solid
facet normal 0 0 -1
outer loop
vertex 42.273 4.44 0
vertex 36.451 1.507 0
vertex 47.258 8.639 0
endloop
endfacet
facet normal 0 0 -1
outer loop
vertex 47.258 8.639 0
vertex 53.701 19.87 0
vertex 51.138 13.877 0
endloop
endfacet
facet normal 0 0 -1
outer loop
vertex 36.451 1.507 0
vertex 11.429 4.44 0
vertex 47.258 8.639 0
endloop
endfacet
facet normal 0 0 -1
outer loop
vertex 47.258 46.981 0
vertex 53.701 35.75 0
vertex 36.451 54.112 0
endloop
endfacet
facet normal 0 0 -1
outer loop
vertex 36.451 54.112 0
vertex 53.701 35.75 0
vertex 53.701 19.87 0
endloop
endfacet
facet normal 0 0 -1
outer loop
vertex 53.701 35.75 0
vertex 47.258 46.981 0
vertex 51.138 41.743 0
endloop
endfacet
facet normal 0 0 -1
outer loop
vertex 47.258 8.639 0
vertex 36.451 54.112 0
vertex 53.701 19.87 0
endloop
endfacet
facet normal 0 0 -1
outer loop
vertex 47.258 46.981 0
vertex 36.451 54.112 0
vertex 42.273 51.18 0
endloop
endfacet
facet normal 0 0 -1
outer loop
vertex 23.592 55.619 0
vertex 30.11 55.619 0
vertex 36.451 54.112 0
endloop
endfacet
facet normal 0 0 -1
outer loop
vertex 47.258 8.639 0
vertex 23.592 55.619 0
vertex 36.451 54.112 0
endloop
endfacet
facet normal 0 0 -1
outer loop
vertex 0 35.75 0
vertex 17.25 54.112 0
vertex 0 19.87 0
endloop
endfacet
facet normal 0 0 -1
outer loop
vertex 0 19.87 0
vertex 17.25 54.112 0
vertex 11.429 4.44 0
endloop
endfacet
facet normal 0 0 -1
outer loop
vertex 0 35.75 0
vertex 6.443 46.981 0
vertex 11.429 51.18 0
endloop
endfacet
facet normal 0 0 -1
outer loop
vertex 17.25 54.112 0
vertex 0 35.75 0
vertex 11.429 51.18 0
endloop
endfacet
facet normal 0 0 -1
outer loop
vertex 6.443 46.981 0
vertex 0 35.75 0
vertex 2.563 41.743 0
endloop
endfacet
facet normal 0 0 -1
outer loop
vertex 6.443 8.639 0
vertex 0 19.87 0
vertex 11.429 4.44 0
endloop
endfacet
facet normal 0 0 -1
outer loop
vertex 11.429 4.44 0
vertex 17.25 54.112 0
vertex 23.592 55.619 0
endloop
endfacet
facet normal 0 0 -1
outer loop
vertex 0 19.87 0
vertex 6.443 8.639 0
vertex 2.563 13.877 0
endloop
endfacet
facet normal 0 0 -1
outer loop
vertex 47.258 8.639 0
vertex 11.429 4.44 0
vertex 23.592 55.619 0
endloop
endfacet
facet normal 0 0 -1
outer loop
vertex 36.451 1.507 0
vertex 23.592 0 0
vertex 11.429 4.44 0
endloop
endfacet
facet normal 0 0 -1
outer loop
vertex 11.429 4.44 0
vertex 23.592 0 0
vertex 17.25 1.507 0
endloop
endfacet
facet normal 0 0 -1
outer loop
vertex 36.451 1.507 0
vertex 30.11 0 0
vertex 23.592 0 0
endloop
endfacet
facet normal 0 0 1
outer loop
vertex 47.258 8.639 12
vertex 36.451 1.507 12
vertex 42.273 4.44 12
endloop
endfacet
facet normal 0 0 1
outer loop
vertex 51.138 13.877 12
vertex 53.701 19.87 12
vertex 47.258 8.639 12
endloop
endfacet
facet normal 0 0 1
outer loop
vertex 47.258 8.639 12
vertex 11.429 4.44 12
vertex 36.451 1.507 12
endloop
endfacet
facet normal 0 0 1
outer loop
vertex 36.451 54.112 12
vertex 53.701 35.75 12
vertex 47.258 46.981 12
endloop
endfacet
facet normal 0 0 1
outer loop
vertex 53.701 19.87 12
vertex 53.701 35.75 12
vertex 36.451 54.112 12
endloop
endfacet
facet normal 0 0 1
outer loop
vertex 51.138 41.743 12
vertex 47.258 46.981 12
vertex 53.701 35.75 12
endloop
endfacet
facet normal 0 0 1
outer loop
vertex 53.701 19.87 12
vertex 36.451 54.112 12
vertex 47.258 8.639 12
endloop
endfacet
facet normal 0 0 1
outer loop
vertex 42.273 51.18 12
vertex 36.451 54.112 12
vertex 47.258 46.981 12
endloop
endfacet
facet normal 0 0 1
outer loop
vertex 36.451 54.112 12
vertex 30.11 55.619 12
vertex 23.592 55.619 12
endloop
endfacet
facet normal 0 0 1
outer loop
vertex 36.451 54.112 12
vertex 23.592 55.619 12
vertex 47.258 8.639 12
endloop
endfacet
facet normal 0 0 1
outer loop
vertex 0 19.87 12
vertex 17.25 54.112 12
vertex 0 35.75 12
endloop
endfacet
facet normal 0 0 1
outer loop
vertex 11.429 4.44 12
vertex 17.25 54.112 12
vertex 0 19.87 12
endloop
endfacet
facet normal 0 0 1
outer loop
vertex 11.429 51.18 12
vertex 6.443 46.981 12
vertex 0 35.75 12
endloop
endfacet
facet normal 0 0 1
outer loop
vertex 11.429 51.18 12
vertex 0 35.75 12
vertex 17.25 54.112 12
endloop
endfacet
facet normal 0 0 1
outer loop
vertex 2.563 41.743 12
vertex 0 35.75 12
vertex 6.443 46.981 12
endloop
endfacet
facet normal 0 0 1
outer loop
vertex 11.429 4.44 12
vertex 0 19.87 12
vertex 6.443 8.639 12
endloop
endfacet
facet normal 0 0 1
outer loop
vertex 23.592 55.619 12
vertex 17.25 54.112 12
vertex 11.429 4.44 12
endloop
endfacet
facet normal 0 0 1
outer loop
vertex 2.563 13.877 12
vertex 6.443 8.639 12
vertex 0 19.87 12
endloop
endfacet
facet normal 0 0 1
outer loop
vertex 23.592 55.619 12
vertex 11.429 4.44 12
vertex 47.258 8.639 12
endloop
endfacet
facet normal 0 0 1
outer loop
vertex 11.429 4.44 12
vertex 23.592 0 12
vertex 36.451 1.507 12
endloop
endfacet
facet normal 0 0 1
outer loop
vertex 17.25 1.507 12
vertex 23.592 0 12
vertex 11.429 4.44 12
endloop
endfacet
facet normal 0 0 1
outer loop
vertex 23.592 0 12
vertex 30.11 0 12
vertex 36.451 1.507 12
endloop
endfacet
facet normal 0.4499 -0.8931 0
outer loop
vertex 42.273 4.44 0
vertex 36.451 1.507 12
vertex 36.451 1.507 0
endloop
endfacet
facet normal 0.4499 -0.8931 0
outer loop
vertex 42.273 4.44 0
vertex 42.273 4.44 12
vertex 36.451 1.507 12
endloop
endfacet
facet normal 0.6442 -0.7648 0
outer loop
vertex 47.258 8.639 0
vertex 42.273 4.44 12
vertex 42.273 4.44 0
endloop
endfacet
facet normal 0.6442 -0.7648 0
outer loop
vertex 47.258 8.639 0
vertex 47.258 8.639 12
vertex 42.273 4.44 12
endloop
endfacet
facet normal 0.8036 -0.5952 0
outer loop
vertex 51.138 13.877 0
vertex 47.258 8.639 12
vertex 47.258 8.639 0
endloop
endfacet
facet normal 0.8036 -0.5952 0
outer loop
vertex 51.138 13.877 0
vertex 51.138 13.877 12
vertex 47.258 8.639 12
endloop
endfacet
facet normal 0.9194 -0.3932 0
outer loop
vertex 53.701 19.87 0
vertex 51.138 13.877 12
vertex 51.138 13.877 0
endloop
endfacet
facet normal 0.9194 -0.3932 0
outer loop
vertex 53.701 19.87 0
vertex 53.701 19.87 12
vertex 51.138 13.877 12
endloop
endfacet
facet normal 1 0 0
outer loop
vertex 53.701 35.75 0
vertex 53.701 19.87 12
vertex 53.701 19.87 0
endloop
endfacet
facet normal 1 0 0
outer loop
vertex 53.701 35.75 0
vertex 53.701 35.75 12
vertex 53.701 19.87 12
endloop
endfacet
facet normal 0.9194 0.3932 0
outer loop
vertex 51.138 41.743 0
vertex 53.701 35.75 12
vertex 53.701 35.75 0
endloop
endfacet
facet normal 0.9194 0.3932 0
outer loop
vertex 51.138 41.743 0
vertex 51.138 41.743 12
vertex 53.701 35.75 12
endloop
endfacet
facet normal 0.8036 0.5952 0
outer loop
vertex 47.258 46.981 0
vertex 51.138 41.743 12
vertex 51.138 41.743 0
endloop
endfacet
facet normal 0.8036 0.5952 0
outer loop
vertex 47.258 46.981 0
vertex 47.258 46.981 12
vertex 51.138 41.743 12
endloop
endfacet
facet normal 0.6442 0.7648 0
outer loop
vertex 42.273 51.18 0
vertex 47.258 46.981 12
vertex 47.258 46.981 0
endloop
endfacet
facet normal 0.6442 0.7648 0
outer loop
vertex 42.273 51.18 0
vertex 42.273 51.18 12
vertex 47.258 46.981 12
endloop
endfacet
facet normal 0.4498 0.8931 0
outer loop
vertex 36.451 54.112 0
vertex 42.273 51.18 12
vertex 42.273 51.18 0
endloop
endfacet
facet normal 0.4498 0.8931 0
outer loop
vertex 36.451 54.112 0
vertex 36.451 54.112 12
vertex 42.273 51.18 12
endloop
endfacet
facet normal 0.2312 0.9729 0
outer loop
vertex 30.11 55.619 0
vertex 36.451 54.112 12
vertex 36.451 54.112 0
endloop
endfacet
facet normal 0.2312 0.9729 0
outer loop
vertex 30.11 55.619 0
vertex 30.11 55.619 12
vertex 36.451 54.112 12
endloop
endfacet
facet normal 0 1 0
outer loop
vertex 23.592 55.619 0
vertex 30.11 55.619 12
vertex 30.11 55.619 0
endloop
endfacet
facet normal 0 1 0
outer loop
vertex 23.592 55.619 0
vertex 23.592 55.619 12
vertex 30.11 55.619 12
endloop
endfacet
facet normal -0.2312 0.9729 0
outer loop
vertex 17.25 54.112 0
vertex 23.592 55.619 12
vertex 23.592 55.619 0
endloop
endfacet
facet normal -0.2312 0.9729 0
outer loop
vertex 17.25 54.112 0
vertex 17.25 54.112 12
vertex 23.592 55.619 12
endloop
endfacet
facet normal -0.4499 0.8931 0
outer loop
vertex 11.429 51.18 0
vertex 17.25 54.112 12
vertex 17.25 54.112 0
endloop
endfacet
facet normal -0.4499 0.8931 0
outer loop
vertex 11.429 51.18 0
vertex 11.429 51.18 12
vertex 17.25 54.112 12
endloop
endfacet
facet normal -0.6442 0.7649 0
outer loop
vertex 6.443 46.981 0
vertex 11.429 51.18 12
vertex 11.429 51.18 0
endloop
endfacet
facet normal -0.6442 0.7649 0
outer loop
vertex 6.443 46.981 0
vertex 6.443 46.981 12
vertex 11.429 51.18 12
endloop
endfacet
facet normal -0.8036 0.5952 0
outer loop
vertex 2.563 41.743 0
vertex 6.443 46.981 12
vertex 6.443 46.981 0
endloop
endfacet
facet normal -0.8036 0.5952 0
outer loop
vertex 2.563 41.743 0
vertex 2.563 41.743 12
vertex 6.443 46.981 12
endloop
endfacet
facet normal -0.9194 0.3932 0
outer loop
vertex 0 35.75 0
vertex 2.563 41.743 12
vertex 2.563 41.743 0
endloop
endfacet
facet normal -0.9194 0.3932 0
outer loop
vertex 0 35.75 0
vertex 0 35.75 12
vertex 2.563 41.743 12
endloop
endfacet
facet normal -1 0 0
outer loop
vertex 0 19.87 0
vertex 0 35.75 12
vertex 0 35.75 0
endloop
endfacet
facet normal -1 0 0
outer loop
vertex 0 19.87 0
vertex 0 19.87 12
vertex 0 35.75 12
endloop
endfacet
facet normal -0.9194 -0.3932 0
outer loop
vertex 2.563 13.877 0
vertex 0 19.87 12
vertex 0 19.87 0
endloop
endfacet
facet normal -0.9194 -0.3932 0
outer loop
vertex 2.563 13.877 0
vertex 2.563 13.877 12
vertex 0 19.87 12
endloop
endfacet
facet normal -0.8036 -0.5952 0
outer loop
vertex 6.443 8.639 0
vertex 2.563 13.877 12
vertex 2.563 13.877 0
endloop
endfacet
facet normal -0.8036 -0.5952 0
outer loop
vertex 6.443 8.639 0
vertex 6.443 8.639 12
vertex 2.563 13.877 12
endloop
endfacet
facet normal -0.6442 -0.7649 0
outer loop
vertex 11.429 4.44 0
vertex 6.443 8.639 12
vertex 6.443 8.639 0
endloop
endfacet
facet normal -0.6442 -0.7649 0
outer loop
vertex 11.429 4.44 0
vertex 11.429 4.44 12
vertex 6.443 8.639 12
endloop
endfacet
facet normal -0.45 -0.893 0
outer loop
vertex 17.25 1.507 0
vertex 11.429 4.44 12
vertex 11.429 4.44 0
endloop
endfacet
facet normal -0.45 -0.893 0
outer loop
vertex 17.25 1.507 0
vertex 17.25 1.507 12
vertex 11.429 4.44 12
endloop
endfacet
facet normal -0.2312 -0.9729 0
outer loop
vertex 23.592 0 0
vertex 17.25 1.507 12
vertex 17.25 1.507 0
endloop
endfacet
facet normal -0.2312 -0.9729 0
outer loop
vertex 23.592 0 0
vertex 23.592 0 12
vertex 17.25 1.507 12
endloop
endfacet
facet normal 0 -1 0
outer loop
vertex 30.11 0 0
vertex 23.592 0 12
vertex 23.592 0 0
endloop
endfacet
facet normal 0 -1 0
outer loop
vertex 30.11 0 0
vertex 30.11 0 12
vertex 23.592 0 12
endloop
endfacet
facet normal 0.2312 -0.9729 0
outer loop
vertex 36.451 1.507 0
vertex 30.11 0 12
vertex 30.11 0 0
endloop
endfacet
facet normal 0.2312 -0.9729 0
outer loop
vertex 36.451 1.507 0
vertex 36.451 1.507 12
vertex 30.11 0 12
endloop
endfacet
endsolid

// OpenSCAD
$fn = 32;

// ----------------------------------------------------------------------
// Flat adaptor: double_d, 12 mm thick
// ----------------------------------------------------------------------

// --- parameters (mm) ---
profile_height = 12;      // extrusion height
profile_points = 24;      // points of the closed outline

profile = [[53.701, 35.75], [51.138, 41.743], [47.258, 46.981], [42.273, 51.18], [36.451, 54.112], [30.11, 55.619], [23.592, 55.619], [17.25, 54.112], [11.429, 51.18], [6.443, 46.981], [2.563, 41.743], [0, 35.75], [0, 19.87], [2.563, 13.877], [6.443, 8.639], [11.429, 4.44], [17.25, 1.507], [23.592, 0], [30.11, 0], [36.451, 1.507], [42.273, 4.44], [47.258, 8.639], [51.138, 13.877], [53.701, 19.87]];  // single closed polygon, 24 points, counter clockwise

// --- the one profile operation ---
linear_extrude(height = profile_height) polygon(points = profile);
